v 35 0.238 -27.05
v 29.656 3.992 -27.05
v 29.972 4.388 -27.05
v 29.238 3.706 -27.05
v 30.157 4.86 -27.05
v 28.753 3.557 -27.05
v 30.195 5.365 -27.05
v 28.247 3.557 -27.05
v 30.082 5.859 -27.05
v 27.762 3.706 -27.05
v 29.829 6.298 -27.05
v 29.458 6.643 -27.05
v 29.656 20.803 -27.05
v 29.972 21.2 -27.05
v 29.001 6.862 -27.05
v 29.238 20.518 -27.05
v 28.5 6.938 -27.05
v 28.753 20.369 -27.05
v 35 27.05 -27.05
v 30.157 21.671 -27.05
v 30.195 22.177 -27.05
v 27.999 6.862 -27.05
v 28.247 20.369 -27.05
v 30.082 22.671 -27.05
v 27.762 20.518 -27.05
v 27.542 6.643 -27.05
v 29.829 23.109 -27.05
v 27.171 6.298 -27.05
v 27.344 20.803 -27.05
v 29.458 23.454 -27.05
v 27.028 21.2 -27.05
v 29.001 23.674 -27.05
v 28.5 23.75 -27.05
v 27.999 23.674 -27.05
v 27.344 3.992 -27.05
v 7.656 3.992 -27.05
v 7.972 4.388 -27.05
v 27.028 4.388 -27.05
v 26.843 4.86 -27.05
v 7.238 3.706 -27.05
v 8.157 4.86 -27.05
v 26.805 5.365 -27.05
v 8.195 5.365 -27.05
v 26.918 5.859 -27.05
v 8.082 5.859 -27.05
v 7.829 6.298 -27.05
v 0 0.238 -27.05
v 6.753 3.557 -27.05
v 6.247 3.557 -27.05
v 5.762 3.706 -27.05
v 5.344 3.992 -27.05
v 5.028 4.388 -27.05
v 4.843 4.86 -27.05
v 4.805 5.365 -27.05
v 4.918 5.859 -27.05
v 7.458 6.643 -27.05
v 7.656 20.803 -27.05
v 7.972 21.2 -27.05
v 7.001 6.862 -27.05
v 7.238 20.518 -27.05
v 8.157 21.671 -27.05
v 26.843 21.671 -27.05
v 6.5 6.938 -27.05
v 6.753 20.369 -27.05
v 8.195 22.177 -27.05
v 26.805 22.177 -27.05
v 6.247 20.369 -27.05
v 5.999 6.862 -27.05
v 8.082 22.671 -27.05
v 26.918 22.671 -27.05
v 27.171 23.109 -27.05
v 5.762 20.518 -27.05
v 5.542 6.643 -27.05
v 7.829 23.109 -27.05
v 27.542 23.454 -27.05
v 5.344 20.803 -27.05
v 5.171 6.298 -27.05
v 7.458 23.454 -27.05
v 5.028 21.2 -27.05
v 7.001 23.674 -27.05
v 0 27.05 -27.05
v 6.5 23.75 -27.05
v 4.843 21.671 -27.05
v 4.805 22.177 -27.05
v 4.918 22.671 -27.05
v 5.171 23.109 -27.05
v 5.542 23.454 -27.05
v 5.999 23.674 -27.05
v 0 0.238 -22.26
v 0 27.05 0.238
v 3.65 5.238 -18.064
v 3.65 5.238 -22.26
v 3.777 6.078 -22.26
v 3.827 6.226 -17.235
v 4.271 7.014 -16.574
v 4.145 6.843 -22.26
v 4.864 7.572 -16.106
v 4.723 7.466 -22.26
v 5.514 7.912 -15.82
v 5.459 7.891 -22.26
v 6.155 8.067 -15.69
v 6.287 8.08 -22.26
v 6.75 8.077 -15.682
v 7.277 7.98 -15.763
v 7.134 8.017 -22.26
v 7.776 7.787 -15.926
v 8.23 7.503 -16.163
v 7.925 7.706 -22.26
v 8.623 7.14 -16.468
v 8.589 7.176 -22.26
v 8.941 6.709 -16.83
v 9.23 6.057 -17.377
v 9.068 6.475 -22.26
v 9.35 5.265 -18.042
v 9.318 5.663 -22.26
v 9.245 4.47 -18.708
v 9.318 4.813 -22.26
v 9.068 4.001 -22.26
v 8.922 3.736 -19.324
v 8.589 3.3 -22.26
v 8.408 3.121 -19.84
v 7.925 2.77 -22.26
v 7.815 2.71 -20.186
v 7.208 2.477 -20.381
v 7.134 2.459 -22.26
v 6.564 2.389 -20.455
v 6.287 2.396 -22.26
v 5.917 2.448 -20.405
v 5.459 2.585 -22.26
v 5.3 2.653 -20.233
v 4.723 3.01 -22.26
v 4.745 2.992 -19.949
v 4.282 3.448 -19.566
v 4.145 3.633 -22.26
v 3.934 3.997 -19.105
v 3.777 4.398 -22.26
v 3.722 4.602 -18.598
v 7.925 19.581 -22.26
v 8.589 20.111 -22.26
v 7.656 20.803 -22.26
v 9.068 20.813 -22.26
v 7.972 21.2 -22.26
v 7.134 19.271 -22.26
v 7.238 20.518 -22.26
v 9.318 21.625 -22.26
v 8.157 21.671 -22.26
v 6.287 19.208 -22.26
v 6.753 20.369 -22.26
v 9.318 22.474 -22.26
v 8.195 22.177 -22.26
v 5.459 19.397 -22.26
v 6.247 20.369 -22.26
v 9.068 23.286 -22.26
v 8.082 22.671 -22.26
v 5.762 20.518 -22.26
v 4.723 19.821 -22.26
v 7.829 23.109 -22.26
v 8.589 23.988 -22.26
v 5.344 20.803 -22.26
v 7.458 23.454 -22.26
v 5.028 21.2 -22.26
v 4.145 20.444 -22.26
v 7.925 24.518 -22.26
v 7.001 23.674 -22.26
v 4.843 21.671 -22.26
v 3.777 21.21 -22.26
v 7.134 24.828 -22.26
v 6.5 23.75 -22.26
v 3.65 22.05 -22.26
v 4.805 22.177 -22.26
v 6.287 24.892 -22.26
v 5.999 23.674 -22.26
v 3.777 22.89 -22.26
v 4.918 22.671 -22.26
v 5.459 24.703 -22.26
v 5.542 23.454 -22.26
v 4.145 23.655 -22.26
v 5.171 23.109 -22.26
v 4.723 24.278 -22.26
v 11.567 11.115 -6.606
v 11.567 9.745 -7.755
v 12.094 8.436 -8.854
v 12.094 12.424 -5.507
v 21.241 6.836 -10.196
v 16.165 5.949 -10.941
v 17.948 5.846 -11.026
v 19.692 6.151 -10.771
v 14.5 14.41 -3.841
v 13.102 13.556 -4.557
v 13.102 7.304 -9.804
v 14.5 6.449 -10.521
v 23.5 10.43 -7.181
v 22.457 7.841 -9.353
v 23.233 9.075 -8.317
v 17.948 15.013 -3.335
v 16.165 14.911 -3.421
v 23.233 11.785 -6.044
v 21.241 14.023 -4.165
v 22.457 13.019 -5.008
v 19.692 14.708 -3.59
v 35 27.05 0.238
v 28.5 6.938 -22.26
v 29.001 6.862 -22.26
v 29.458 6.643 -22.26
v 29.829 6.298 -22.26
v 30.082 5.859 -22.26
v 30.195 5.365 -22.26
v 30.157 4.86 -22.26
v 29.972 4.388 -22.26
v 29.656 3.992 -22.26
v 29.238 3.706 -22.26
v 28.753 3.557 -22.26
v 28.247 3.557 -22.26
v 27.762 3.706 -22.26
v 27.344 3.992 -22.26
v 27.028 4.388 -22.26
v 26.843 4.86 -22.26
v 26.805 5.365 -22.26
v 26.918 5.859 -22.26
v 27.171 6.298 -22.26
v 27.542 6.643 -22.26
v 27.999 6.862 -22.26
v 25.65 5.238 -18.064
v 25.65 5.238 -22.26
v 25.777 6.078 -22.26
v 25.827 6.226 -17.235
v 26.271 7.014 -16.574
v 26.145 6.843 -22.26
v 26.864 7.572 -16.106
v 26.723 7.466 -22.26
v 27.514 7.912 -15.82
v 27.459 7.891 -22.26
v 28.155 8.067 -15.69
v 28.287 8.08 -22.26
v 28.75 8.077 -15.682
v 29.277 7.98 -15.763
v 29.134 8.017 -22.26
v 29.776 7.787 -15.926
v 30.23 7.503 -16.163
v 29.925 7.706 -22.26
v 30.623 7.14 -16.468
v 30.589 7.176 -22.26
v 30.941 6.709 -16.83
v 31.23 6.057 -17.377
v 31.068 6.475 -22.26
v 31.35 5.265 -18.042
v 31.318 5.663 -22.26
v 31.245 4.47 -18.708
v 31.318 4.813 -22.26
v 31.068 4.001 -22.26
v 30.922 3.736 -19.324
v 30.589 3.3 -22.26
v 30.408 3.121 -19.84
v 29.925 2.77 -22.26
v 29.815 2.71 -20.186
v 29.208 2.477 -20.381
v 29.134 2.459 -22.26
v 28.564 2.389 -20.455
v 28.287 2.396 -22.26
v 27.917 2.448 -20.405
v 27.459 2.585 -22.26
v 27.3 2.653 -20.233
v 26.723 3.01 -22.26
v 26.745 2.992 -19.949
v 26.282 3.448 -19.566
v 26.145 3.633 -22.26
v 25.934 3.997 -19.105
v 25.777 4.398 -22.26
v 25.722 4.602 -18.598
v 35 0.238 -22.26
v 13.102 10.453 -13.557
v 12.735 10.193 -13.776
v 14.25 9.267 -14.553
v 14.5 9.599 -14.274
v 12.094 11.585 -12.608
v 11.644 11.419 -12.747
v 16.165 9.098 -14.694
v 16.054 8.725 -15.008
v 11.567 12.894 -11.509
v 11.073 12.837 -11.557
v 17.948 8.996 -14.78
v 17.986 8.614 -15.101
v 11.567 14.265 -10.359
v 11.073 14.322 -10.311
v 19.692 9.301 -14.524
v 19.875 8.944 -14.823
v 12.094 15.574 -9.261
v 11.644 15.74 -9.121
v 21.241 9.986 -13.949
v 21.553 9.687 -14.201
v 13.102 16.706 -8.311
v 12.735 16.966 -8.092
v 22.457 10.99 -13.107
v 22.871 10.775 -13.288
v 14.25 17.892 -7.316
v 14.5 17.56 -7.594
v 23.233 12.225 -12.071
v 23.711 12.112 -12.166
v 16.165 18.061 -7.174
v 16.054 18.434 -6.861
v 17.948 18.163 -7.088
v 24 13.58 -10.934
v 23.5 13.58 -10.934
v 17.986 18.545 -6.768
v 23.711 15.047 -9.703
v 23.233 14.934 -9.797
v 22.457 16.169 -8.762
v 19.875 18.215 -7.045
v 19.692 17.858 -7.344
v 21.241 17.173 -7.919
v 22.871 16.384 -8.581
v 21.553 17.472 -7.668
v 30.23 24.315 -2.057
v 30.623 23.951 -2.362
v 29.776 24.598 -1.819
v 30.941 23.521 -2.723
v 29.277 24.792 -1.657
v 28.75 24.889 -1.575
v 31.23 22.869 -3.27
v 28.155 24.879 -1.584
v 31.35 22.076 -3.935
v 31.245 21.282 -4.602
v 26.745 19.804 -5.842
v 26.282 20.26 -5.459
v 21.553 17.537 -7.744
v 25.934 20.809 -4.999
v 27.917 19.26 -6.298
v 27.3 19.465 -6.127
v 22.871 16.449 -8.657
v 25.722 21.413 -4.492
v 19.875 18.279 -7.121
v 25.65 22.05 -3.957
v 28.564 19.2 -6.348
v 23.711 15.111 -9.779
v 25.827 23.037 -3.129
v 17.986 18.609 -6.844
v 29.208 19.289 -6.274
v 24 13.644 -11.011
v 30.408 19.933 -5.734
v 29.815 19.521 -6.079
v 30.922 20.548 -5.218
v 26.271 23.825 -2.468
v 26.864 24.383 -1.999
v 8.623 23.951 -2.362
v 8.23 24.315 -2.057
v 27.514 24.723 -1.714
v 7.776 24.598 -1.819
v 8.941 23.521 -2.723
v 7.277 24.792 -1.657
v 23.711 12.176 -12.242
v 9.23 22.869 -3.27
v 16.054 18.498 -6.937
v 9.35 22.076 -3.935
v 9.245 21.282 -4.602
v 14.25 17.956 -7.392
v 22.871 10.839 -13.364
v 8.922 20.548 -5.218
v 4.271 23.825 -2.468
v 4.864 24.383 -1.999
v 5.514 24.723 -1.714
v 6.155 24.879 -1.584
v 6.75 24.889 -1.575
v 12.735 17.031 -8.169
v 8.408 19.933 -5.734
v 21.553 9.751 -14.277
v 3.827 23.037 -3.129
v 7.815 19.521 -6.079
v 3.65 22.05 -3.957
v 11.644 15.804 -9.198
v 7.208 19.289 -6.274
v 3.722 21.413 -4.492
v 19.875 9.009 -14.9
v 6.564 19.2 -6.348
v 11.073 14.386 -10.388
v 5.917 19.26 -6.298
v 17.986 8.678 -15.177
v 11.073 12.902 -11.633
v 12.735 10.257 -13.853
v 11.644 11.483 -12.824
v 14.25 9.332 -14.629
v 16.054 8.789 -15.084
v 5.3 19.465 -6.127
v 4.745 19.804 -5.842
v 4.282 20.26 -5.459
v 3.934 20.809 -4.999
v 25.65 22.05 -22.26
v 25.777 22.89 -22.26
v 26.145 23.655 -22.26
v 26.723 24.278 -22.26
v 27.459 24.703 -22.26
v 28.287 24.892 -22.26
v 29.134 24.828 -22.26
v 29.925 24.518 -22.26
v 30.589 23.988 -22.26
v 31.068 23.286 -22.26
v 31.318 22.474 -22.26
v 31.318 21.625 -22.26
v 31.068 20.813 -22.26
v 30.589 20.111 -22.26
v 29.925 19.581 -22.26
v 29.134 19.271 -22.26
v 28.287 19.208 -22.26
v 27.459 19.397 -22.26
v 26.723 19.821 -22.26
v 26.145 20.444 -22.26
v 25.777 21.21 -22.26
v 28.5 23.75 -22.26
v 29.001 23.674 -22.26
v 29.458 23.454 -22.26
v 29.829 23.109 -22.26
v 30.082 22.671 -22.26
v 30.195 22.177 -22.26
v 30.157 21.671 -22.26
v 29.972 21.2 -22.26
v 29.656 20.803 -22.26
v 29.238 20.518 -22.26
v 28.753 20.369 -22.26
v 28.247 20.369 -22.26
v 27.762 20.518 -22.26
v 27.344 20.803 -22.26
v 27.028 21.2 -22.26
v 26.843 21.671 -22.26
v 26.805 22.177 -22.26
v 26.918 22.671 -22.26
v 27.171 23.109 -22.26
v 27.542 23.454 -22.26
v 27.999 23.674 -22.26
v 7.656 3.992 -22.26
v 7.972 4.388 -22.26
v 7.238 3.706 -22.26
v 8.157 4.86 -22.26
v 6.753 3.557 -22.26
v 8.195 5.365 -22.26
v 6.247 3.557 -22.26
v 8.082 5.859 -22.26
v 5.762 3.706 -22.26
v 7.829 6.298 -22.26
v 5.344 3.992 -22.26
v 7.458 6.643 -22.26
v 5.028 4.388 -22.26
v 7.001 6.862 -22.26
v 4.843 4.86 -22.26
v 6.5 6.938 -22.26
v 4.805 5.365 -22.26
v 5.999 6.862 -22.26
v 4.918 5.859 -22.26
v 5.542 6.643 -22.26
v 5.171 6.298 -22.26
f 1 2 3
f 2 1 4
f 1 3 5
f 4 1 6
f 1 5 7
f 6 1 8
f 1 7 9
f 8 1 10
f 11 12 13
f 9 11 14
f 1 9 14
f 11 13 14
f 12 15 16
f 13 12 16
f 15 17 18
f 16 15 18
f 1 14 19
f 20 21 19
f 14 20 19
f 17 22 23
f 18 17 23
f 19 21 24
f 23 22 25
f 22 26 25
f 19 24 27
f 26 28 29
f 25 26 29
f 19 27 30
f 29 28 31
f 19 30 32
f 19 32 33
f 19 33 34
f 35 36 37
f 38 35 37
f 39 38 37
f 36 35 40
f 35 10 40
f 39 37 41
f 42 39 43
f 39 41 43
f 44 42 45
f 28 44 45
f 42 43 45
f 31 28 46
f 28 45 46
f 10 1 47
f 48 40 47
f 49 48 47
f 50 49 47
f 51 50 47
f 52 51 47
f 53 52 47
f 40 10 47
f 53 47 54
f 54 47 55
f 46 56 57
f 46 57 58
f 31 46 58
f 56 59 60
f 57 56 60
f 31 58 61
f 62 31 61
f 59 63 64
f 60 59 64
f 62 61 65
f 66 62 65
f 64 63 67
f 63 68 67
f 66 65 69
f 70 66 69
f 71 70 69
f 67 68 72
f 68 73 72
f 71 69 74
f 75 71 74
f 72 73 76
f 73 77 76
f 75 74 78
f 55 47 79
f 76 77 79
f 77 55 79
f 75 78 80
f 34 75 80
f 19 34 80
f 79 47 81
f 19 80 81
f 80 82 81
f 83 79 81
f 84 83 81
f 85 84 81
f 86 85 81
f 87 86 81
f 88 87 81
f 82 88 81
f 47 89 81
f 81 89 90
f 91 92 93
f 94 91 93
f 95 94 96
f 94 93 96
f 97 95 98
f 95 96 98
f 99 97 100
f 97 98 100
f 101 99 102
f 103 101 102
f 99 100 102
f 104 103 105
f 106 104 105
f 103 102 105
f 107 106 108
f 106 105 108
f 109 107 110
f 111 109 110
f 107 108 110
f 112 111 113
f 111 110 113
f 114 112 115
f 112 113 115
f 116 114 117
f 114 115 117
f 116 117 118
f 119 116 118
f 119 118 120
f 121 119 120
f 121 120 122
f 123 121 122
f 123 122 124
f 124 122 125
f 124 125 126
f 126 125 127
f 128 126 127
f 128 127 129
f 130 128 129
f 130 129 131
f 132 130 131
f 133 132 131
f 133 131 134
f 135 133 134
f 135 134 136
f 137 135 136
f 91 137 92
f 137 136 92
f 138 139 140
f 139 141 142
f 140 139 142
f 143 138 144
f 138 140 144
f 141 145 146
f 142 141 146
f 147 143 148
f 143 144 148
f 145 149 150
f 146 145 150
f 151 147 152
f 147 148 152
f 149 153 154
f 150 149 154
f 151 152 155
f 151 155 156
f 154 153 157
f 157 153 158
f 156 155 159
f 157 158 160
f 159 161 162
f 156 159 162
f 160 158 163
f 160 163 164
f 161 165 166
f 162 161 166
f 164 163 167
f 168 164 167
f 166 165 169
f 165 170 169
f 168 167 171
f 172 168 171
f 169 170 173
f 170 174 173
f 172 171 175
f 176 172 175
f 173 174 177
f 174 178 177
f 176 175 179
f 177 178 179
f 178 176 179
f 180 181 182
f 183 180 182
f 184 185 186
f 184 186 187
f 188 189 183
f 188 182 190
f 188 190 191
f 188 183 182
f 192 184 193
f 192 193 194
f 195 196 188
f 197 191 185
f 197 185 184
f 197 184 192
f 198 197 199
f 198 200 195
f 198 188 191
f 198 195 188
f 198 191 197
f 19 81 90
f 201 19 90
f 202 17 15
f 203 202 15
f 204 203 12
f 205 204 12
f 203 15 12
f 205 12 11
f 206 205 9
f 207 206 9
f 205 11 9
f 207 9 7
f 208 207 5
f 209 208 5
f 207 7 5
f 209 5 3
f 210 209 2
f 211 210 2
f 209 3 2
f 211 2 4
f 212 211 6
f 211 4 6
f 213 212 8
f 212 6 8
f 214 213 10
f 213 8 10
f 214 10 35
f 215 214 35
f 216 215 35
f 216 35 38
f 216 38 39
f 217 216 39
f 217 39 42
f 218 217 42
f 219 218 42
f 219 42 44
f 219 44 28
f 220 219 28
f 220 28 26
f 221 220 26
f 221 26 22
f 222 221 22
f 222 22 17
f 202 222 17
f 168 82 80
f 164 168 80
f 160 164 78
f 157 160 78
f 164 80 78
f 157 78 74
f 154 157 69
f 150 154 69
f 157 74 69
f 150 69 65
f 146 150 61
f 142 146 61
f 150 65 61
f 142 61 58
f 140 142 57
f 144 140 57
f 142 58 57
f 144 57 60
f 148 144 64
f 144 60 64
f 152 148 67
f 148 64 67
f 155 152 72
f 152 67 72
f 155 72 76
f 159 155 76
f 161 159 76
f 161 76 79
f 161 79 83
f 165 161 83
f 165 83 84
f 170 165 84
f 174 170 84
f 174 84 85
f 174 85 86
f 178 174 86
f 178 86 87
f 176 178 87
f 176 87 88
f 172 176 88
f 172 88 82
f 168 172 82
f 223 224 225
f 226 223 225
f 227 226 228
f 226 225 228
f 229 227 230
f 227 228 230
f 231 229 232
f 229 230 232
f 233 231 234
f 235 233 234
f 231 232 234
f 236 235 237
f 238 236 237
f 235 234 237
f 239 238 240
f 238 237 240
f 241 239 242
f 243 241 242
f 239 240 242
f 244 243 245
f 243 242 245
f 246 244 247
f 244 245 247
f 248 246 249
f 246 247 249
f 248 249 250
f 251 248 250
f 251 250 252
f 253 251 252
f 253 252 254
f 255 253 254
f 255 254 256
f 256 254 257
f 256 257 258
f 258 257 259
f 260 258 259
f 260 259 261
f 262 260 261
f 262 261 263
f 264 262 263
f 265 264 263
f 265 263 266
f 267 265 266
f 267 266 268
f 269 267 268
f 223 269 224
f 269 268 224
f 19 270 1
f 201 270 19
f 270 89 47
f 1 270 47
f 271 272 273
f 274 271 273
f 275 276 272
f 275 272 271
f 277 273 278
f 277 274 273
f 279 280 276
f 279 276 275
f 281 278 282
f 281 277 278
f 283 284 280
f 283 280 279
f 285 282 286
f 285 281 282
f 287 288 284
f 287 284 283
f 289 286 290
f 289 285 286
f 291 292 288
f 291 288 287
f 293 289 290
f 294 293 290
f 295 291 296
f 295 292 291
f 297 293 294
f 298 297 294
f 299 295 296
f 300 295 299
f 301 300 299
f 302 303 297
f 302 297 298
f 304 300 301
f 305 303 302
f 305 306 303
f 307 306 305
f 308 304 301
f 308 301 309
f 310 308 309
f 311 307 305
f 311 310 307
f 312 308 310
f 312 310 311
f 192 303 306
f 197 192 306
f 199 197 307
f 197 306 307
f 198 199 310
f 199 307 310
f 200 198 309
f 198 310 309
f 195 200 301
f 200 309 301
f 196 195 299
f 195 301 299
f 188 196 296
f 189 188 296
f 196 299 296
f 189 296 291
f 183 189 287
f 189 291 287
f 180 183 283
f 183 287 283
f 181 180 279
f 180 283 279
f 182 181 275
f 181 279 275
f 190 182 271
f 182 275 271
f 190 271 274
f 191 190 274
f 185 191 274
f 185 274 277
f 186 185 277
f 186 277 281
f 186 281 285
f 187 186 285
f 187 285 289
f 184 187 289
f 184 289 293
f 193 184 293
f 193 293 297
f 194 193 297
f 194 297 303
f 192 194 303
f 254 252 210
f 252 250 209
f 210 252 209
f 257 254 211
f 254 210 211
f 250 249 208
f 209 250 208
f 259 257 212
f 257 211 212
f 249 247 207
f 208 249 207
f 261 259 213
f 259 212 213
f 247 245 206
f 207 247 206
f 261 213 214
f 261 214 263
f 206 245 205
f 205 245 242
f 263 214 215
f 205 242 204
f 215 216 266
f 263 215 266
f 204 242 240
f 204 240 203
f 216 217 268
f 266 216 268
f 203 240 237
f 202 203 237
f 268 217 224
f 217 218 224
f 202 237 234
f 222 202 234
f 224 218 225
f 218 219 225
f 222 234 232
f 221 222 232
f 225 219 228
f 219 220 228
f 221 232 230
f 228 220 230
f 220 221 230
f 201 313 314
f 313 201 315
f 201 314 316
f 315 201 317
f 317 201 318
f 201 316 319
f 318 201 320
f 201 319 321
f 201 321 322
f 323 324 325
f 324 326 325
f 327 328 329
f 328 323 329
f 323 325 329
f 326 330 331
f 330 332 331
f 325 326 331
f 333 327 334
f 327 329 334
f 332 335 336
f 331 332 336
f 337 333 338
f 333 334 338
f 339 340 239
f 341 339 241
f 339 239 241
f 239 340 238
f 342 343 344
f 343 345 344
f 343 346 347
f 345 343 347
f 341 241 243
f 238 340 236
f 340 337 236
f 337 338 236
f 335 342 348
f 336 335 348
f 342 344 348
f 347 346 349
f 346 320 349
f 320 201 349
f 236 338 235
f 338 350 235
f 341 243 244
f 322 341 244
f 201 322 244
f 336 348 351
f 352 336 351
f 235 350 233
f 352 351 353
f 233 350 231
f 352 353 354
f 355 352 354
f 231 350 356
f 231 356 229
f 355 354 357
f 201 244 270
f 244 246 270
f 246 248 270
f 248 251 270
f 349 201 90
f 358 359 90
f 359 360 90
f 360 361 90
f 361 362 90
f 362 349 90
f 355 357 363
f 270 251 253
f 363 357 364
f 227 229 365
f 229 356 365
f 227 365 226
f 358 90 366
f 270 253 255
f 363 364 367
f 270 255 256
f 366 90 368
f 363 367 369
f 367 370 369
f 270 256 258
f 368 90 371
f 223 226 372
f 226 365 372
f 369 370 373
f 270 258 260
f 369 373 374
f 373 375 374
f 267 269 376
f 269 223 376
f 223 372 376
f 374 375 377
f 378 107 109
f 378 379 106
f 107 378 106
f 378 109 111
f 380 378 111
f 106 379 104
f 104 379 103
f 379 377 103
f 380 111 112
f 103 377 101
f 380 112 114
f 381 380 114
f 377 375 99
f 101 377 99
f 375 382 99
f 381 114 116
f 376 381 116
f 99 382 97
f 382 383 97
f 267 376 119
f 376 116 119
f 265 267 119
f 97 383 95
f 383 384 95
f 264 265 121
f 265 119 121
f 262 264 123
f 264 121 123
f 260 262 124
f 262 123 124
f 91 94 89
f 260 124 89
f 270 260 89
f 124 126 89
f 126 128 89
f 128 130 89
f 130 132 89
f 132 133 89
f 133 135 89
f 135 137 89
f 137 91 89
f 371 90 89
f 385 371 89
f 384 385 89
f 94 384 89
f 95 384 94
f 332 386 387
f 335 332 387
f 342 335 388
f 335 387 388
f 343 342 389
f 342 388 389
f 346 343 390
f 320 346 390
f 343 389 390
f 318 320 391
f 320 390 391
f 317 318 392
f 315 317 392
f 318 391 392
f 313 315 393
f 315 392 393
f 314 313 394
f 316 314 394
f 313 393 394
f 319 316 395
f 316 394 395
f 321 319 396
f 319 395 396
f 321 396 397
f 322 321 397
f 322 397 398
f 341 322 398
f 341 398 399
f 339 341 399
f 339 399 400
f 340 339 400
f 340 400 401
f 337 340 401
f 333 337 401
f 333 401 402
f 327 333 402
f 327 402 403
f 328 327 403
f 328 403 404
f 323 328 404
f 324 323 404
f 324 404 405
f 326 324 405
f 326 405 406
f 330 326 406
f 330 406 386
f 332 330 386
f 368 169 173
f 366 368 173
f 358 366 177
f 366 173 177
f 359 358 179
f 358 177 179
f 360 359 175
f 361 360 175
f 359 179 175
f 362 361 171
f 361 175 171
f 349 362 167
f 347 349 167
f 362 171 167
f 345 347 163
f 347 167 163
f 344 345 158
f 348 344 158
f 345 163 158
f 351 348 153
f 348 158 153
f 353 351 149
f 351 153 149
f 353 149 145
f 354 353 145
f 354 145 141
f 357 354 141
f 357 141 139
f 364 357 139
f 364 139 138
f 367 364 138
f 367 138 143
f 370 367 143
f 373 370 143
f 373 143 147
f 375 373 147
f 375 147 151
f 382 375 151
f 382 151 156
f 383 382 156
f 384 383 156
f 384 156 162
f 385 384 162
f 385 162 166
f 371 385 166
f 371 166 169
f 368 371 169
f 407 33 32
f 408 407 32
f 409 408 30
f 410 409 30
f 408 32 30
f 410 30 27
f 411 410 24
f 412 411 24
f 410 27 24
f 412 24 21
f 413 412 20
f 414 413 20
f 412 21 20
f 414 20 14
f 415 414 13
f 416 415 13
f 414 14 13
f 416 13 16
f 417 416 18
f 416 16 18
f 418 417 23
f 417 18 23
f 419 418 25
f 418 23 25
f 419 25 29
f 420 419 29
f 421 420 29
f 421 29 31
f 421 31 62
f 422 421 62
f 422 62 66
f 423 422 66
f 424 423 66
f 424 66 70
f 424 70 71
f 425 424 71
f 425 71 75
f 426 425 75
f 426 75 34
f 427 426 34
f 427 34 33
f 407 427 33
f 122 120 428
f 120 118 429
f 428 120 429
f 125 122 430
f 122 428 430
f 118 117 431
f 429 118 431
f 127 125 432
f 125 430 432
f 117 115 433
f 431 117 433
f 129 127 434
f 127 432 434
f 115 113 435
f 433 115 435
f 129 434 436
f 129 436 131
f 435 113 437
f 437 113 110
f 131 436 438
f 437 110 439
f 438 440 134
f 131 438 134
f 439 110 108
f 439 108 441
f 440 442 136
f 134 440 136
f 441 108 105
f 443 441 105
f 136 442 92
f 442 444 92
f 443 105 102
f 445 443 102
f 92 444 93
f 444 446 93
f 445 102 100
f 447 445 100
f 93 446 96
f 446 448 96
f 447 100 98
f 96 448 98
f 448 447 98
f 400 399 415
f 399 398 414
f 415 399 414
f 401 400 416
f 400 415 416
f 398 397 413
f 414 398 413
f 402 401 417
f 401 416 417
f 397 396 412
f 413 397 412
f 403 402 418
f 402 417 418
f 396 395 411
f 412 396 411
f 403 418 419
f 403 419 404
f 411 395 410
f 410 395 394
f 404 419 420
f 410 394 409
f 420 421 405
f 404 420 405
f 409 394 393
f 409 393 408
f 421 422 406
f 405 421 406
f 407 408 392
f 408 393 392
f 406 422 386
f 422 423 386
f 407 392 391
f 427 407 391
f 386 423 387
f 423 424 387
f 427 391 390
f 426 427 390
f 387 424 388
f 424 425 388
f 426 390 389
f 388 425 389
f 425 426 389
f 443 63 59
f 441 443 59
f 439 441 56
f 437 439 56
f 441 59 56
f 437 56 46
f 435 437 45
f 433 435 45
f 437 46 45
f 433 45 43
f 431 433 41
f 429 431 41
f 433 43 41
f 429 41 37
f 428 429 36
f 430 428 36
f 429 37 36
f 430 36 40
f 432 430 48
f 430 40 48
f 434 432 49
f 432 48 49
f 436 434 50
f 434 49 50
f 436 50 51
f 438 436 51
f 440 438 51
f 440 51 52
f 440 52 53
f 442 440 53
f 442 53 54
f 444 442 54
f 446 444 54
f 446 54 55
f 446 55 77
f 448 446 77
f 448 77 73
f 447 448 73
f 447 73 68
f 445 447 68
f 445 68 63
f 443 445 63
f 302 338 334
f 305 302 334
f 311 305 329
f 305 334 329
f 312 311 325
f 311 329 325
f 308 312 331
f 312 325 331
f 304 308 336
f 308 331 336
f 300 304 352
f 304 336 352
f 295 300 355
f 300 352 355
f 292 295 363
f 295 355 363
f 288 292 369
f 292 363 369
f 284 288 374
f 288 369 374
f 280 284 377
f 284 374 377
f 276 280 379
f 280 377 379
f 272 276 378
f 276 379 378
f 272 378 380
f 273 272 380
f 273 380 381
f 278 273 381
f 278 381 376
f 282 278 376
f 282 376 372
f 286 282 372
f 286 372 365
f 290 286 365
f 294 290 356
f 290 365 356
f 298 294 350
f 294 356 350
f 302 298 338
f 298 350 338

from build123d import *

# Parameters (mm, degrees)
AUFSATZ_LINEAR_AUSTRAGEN1_DEPTH      = 35
SKIZZE3_R                            = 6
AUFSATZ_LINEAR_AUSTRAGEN2_DEPTH      = 5
SKIZZE4_R                            = 6.5
AUFSATZ_LINEAR_AUSTRAGEN3_DEPTH      = 0.1
SKIZZE7_R                            = 2.85
SCHNITT_LINEAR_AUSTRAGEN1_DEPTH      = 23.497566339
F_3_4_3_4_DURCHMESSER_BOHRUNG1_D     = 3.4
F_3_4_3_4_DURCHMESSER_BOHRUNG1_DEPTH = 4.79
K_RPER_VERSCHIEBEN_KOPIEREN1_ANGLE   = 90


with BuildPart() as part:
    # Skizze1 → Aufsatz-Linear austragen1 (new body)
    with BuildSketch(Plane(origin=(0, 0, 0), x_dir=(0, 0, -1), z_dir=(1, 0, 0))):
        Polygon((0, 0), (26.811555509, 0), (26.811555509, 27.287566339), (0, 4.79), align=None)
    extrude(amount=AUFSATZ_LINEAR_AUSTRAGEN1_DEPTH)

    # Skizze3 → Aufsatz-Linear austragen2 (add)
    with BuildSketch(Plane(origin=(0, 2.810887386, 2.358614568), x_dir=(1, 0, 0), z_dir=(0, 0.766044443, 0.64278761))):
        with Locations((17.5, 20.57895265)):
            Circle(SKIZZE3_R)
    extrude(amount=AUFSATZ_LINEAR_AUSTRAGEN2_DEPTH)

    # Skizze4 → Aufsatz-Linear austragen3 (add)
    with BuildSketch(Plane(origin=(0, 2.810887386, 2.358614568), x_dir=(1, 0, 0), z_dir=(0, 0.766044443, 0.64278761))):
        with Locations((17.5, 20.57895265)):
            Circle(SKIZZE4_R)
    extrude(amount=AUFSATZ_LINEAR_AUSTRAGEN3_DEPTH)

    # Skizze7 → Schnitt-Linear austragen1 (cut, through all)
    with BuildSketch(Plane(origin=(0, 4.79, 0), x_dir=(-1, 0, 0), z_dir=(0, -1, 0))):
        with Locations((-28.5, 21.811555509)):
            Circle(SKIZZE7_R)
        with Locations((-6.5, 21.811555509)):
            Circle(SKIZZE7_R)
        with Locations((-6.5, 5)):
            Circle(SKIZZE7_R)
        with Locations((-28.5, 5)):
            Circle(SKIZZE7_R)
    extrude(amount=-SCHNITT_LINEAR_AUSTRAGEN1_DEPTH, mode=Mode.SUBTRACT)

    # Ø3.4 (3.4) Durchmesser Bohrung1
    with Locations(Plane(origin=(6.5, 4.79, -21.811555509), x_dir=(0, 0, 1), z_dir=(0, 1, 0))):
        with Locations((0, 0), (16.811555509, 0), (16.811555509, 22), (0, 22)):
            Hole(F_3_4_3_4_DURCHMESSER_BOHRUNG1_D / 2, depth=F_3_4_3_4_DURCHMESSER_BOHRUNG1_DEPTH)


with BuildPart() as part_1:
    # Körper-Verschieben/Kopieren1: moved
    add(part.part.rotate(Axis((0, 13.64378317, -13.405777755), (1, 0, 0)), K_RPER_VERSCHIEBEN_KOPIEREN1_ANGLE))


solid = part_1.part
